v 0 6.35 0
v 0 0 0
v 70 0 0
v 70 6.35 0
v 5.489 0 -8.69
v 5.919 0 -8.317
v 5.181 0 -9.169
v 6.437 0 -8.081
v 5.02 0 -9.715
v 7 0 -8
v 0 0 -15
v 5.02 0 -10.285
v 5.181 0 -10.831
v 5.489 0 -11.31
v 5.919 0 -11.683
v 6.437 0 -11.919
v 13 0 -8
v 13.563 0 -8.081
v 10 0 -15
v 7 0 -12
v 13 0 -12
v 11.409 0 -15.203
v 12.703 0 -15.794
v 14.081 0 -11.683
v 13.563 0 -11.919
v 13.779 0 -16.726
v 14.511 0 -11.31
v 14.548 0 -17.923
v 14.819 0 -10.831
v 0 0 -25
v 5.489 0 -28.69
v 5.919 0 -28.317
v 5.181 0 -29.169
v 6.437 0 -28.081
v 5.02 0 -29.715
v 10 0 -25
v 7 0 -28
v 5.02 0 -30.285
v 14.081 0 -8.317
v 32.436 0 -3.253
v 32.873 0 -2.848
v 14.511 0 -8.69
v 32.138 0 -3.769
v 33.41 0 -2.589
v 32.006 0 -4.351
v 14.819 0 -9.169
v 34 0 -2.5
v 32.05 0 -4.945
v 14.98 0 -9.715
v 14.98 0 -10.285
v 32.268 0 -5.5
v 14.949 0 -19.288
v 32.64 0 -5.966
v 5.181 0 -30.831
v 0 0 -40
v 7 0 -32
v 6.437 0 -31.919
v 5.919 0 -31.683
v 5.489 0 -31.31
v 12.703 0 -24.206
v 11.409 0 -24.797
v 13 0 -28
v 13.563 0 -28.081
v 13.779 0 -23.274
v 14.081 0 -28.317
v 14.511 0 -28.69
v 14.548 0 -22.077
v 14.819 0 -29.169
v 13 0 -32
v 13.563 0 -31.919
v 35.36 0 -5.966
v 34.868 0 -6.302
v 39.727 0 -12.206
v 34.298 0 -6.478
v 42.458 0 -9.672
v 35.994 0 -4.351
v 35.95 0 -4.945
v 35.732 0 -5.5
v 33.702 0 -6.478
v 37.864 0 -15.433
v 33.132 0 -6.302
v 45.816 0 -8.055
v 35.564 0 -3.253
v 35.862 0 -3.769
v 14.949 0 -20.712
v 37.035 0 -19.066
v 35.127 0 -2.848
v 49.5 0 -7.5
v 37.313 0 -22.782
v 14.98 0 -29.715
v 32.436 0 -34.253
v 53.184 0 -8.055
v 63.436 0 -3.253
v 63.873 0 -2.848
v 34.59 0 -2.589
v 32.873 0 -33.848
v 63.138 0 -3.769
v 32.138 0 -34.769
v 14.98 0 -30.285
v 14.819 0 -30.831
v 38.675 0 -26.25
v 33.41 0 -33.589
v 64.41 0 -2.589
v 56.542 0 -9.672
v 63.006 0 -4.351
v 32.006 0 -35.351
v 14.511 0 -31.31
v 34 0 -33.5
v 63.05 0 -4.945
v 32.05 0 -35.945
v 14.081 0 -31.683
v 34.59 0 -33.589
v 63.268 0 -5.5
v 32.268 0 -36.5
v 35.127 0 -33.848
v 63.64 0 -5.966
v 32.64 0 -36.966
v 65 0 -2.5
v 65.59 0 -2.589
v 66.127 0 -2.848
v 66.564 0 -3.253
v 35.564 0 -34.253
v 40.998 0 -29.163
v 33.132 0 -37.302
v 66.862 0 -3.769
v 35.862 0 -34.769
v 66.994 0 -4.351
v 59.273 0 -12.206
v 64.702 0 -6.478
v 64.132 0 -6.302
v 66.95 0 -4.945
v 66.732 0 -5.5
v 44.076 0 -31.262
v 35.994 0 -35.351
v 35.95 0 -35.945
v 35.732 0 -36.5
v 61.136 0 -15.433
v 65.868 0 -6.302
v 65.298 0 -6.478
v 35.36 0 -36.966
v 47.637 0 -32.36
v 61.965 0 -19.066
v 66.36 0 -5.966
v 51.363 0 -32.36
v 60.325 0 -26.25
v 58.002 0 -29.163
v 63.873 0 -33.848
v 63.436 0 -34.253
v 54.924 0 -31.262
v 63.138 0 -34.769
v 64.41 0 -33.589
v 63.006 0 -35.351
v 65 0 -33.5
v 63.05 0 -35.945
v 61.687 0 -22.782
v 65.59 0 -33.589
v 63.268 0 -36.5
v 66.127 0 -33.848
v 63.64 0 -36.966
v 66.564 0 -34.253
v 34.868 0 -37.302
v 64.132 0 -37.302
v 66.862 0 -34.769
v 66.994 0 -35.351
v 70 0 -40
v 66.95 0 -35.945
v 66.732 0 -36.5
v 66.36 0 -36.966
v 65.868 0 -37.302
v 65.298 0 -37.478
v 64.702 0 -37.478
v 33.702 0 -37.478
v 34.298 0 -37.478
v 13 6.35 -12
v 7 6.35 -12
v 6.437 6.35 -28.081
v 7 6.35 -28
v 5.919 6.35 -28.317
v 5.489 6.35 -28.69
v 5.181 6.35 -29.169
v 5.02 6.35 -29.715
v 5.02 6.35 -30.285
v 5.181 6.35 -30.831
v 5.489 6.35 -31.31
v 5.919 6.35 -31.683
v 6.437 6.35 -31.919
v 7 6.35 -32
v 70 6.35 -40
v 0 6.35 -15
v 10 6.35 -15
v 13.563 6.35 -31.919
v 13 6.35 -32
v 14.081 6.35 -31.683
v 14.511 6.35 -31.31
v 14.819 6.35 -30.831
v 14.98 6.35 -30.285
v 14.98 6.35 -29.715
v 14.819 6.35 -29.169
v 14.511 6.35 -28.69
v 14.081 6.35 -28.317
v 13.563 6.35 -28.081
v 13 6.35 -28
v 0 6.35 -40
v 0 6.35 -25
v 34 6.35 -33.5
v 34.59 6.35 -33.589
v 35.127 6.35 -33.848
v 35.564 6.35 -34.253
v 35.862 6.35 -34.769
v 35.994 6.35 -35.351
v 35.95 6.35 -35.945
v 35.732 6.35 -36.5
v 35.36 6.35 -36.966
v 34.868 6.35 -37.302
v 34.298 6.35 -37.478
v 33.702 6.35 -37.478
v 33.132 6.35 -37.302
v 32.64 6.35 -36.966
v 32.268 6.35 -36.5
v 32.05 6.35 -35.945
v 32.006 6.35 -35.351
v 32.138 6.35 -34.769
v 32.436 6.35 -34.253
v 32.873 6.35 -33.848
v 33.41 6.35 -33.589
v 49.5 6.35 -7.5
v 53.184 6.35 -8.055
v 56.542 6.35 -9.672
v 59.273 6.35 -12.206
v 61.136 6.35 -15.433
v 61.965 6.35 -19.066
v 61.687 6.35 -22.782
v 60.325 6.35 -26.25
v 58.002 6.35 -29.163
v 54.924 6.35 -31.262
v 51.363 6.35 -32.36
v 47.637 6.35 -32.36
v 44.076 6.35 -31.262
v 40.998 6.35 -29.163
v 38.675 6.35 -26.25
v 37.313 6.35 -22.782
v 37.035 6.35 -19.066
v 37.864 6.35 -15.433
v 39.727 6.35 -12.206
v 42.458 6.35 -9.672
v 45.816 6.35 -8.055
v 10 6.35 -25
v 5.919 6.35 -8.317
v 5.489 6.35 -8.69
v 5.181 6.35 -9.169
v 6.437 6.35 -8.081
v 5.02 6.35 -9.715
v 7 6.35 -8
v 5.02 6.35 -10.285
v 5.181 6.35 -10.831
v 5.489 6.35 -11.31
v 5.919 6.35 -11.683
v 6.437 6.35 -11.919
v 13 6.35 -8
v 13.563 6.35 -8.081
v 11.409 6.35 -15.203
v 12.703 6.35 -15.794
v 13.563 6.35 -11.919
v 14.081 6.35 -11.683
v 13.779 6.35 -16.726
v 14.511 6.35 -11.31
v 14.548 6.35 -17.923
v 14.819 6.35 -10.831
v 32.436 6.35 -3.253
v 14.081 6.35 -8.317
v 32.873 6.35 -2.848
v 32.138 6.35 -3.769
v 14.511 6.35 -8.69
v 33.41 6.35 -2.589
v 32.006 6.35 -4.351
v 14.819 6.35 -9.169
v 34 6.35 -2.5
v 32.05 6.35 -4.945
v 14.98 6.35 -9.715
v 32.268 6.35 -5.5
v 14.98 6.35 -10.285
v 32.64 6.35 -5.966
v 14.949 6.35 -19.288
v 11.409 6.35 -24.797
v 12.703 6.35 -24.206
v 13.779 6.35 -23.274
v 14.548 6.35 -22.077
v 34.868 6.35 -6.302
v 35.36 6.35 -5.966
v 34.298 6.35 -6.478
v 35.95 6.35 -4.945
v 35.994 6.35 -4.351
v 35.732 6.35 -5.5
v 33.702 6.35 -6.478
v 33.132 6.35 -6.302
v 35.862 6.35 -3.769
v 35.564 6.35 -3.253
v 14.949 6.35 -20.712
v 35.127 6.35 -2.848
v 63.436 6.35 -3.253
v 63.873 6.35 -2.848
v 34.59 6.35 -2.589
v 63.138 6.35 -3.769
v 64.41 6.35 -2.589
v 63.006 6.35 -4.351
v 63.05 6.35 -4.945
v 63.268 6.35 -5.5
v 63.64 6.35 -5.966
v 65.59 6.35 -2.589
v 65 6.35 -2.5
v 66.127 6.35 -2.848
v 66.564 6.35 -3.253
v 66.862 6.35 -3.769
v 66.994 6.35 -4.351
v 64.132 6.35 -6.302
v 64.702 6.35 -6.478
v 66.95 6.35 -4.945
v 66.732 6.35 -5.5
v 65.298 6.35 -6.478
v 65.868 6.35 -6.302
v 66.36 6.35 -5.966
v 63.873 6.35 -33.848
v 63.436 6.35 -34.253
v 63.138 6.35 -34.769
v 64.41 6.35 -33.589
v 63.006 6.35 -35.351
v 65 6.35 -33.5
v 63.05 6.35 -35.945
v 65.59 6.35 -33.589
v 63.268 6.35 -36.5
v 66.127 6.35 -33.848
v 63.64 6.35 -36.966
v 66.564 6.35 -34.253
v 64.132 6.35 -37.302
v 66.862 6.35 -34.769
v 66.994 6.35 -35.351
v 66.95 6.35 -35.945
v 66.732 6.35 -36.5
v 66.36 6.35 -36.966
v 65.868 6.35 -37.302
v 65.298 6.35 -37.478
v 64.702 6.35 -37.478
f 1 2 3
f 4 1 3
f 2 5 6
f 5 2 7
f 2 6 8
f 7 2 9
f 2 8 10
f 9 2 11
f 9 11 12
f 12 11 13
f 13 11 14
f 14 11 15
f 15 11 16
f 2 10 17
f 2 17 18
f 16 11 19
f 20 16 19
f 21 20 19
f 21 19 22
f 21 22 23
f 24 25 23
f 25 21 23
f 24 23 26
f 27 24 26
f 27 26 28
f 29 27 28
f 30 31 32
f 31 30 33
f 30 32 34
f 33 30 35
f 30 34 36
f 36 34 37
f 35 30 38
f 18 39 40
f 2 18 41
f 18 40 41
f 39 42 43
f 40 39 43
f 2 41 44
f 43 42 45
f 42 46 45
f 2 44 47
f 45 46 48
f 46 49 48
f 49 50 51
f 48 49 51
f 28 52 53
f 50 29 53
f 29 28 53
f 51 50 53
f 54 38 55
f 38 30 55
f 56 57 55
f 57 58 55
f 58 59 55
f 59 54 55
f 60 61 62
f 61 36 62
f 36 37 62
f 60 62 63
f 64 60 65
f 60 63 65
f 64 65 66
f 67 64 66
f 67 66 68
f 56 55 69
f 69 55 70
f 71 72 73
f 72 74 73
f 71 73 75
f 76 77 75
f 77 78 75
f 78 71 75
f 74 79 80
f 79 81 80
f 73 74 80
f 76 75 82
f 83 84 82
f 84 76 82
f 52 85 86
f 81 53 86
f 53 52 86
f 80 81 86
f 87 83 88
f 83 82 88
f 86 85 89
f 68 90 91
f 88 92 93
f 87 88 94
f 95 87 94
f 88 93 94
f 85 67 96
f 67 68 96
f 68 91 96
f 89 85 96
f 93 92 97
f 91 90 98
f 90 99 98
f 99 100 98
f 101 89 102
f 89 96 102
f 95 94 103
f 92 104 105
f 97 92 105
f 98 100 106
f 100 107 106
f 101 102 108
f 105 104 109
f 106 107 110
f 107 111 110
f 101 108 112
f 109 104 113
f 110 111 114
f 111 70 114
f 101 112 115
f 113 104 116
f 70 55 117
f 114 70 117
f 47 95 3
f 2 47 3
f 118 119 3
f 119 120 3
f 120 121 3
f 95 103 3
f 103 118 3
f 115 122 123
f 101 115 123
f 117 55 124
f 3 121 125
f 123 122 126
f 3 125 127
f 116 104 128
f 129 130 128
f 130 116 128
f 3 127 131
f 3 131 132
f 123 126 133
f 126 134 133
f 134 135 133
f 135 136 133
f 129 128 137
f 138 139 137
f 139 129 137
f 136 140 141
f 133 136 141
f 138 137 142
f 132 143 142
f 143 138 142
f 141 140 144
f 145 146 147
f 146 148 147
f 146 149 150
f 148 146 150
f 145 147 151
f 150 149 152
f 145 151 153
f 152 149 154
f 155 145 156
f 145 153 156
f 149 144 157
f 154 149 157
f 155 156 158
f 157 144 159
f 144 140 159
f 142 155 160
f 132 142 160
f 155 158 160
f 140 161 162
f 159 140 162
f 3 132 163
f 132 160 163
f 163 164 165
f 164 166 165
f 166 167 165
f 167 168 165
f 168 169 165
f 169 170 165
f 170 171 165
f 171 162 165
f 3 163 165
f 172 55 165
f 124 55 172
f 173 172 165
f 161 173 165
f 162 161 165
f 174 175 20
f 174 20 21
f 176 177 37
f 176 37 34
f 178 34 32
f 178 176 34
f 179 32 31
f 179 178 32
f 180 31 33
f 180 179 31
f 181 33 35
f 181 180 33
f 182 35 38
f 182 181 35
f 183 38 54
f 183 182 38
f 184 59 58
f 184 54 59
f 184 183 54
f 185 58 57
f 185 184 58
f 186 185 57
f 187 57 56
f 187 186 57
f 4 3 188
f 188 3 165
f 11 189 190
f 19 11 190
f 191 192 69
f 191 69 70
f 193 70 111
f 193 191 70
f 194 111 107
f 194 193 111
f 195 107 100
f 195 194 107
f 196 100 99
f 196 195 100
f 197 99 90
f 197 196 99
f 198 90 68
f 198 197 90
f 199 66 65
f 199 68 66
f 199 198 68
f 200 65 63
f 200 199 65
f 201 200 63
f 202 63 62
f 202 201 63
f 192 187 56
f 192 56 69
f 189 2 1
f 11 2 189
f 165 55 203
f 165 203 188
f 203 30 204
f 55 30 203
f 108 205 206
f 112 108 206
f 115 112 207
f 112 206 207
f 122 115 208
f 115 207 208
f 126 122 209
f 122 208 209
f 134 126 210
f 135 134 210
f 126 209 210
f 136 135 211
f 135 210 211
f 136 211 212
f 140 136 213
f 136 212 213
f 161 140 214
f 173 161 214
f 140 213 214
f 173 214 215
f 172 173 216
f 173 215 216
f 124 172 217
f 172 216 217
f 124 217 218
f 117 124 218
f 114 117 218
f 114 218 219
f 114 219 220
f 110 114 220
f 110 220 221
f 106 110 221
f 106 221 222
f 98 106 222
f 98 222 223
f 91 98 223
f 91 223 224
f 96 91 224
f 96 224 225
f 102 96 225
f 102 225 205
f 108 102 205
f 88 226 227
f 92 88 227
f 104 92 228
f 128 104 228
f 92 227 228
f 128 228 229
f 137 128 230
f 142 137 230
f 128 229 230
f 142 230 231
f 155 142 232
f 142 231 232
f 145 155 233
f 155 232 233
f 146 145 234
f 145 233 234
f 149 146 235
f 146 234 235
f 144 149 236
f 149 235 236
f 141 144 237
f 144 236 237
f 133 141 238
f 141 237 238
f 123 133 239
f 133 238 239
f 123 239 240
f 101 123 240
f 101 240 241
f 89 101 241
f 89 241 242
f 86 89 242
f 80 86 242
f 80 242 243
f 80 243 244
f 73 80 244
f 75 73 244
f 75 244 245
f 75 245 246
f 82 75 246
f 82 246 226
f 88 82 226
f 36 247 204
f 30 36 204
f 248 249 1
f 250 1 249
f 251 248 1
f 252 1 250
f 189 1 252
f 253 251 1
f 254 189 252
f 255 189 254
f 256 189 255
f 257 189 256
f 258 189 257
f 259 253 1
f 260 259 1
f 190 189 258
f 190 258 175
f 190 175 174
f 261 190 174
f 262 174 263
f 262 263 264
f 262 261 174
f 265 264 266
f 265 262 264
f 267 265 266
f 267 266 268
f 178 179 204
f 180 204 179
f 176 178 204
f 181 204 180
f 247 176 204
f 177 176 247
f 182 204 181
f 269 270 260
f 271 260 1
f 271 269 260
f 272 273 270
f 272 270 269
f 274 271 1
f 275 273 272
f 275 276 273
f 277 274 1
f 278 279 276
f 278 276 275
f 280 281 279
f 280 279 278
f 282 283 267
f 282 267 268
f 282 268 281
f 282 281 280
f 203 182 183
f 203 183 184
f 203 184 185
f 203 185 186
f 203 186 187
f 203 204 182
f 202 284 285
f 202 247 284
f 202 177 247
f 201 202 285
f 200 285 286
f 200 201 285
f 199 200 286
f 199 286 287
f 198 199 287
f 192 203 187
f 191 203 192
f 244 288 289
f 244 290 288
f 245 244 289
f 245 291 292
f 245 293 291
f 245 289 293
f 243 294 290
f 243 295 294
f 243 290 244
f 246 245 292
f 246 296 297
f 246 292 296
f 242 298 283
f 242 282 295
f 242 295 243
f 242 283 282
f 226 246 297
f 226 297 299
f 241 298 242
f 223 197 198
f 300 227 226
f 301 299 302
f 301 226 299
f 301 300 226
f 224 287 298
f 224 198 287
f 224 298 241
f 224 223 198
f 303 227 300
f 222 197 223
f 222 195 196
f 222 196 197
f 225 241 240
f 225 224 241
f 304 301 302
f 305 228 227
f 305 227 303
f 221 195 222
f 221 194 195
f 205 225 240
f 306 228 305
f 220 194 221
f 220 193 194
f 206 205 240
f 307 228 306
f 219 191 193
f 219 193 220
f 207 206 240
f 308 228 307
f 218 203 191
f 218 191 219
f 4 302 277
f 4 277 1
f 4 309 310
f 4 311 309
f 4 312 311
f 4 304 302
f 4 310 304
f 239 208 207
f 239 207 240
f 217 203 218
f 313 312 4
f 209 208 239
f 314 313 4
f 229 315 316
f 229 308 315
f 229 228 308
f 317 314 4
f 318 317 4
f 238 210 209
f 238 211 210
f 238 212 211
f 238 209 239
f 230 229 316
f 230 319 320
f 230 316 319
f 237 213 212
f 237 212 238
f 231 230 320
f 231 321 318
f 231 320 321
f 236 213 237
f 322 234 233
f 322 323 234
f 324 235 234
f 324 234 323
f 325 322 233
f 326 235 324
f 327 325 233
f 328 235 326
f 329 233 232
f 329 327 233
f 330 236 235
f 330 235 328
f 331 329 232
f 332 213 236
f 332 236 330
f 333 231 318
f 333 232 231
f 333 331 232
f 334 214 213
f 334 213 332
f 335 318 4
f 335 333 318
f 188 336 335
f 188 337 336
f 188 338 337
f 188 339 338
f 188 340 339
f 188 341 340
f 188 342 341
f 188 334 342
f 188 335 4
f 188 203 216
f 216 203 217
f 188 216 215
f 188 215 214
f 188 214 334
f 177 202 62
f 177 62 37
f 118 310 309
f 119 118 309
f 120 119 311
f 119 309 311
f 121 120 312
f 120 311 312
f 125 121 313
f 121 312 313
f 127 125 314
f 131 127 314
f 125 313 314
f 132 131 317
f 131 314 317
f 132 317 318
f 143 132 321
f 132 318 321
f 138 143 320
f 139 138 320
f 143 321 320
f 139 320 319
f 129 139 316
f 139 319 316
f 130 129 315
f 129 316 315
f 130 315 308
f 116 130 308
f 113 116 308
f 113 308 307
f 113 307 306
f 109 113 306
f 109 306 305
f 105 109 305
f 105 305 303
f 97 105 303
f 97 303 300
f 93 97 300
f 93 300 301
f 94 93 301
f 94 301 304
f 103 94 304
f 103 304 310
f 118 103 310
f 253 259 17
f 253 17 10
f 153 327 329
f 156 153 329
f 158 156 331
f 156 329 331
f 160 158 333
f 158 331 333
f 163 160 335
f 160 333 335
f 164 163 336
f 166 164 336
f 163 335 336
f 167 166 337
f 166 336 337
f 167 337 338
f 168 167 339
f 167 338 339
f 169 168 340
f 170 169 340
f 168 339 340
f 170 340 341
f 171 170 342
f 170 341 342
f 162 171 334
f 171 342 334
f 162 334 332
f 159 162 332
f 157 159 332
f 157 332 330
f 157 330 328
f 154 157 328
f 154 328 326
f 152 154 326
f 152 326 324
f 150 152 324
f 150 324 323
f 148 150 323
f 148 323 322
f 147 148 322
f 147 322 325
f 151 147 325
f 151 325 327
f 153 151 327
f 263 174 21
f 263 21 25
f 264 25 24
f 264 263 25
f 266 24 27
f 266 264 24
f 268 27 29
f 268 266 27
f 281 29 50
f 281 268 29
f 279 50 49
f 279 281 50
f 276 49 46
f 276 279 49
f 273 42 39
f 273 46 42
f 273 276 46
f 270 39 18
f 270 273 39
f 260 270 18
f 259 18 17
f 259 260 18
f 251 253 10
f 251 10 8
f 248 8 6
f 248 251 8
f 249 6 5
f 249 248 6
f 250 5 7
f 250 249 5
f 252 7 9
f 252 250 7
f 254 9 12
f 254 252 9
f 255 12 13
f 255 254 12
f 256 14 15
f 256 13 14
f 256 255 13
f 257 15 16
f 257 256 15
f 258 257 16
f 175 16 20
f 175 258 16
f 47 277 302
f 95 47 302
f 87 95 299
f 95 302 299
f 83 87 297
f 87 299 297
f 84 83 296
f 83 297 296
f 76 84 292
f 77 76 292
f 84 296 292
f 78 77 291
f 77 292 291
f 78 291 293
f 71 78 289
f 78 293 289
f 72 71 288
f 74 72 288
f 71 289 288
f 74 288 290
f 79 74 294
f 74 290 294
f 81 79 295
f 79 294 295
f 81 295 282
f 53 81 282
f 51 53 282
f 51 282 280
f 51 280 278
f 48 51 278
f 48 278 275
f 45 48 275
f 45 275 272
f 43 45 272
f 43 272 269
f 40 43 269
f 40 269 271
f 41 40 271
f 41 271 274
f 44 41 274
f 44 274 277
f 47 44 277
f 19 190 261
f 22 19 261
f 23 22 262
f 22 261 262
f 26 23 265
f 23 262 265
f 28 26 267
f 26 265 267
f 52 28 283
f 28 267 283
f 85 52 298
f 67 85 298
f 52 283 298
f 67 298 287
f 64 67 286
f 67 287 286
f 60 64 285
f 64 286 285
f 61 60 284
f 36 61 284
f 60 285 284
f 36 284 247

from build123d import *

# Parameters (mm, degrees)
SKETCH1_W           = 70
SKETCH1_H           = 40
BOSS_EXTRUDE1_DEPTH = 6.35
SKETCH2_R           = 12.5
SKETCH2_R_2         = 2
CUT_EXTRUDE1_DEPTH  = 81.872260386


with BuildPart() as part:
    # Sketch1 → Boss-Extrude1 (new body)
    with BuildSketch(Plane(origin=(0, 0, 0), x_dir=(1, 0, 0), z_dir=(0, 1, 0))):
        with Locations((35, 20)):
            Rectangle(SKETCH1_W, SKETCH1_H)
    extrude(amount=BOSS_EXTRUDE1_DEPTH)

    # Sketch2 → Cut-Extrude1 (cut, through all)
    with BuildSketch(Plane(origin=(0, 6.35, 0), x_dir=(1, 0, 0), z_dir=(0, 1, 0))):
        with Locations(Location((49.5, 20, 0), (0, 0, 270))):
            Circle(SKETCH2_R)
        with Locations(Location((34, 35.5, 0), (0, 0, 270))):
            Circle(SKETCH2_R_2)
        with Locations(Location((65, 35.5, 0), (0, 0, 270))):
            Circle(SKETCH2_R_2)
        with Locations(Location((65, 4.5, 0), (0, 0, 270))):
            Circle(SKETCH2_R_2)
        with Locations(Location((34, 4.5, 0), (0, 0, 270))):
            Circle(SKETCH2_R_2)
        with BuildLine():
            Line((10, 25), (0, 25))
            Line((0, 25), (0, 15))
            Line((0, 15), (10, 15))
            ThreePointArc((10, 15), (15, 20), (10, 25))
        make_face()
        with BuildLine():
            Line((13, 28), (7, 28))
            ThreePointArc((7, 28), (5, 30), (7, 32))
            Line((7, 32), (13, 32))
            ThreePointArc((13, 32), (15, 30), (13, 28))
        make_face()
        with BuildLine():
            Line((7, 12), (13, 12))
            ThreePointArc((13, 12), (15, 10), (13, 8))
            Line((13, 8), (7, 8))
            ThreePointArc((7, 8), (5, 10), (7, 12))
        make_face()
    extrude(amount=-CUT_EXTRUDE1_DEPTH, mode=Mode.SUBTRACT)


solid = part.part
